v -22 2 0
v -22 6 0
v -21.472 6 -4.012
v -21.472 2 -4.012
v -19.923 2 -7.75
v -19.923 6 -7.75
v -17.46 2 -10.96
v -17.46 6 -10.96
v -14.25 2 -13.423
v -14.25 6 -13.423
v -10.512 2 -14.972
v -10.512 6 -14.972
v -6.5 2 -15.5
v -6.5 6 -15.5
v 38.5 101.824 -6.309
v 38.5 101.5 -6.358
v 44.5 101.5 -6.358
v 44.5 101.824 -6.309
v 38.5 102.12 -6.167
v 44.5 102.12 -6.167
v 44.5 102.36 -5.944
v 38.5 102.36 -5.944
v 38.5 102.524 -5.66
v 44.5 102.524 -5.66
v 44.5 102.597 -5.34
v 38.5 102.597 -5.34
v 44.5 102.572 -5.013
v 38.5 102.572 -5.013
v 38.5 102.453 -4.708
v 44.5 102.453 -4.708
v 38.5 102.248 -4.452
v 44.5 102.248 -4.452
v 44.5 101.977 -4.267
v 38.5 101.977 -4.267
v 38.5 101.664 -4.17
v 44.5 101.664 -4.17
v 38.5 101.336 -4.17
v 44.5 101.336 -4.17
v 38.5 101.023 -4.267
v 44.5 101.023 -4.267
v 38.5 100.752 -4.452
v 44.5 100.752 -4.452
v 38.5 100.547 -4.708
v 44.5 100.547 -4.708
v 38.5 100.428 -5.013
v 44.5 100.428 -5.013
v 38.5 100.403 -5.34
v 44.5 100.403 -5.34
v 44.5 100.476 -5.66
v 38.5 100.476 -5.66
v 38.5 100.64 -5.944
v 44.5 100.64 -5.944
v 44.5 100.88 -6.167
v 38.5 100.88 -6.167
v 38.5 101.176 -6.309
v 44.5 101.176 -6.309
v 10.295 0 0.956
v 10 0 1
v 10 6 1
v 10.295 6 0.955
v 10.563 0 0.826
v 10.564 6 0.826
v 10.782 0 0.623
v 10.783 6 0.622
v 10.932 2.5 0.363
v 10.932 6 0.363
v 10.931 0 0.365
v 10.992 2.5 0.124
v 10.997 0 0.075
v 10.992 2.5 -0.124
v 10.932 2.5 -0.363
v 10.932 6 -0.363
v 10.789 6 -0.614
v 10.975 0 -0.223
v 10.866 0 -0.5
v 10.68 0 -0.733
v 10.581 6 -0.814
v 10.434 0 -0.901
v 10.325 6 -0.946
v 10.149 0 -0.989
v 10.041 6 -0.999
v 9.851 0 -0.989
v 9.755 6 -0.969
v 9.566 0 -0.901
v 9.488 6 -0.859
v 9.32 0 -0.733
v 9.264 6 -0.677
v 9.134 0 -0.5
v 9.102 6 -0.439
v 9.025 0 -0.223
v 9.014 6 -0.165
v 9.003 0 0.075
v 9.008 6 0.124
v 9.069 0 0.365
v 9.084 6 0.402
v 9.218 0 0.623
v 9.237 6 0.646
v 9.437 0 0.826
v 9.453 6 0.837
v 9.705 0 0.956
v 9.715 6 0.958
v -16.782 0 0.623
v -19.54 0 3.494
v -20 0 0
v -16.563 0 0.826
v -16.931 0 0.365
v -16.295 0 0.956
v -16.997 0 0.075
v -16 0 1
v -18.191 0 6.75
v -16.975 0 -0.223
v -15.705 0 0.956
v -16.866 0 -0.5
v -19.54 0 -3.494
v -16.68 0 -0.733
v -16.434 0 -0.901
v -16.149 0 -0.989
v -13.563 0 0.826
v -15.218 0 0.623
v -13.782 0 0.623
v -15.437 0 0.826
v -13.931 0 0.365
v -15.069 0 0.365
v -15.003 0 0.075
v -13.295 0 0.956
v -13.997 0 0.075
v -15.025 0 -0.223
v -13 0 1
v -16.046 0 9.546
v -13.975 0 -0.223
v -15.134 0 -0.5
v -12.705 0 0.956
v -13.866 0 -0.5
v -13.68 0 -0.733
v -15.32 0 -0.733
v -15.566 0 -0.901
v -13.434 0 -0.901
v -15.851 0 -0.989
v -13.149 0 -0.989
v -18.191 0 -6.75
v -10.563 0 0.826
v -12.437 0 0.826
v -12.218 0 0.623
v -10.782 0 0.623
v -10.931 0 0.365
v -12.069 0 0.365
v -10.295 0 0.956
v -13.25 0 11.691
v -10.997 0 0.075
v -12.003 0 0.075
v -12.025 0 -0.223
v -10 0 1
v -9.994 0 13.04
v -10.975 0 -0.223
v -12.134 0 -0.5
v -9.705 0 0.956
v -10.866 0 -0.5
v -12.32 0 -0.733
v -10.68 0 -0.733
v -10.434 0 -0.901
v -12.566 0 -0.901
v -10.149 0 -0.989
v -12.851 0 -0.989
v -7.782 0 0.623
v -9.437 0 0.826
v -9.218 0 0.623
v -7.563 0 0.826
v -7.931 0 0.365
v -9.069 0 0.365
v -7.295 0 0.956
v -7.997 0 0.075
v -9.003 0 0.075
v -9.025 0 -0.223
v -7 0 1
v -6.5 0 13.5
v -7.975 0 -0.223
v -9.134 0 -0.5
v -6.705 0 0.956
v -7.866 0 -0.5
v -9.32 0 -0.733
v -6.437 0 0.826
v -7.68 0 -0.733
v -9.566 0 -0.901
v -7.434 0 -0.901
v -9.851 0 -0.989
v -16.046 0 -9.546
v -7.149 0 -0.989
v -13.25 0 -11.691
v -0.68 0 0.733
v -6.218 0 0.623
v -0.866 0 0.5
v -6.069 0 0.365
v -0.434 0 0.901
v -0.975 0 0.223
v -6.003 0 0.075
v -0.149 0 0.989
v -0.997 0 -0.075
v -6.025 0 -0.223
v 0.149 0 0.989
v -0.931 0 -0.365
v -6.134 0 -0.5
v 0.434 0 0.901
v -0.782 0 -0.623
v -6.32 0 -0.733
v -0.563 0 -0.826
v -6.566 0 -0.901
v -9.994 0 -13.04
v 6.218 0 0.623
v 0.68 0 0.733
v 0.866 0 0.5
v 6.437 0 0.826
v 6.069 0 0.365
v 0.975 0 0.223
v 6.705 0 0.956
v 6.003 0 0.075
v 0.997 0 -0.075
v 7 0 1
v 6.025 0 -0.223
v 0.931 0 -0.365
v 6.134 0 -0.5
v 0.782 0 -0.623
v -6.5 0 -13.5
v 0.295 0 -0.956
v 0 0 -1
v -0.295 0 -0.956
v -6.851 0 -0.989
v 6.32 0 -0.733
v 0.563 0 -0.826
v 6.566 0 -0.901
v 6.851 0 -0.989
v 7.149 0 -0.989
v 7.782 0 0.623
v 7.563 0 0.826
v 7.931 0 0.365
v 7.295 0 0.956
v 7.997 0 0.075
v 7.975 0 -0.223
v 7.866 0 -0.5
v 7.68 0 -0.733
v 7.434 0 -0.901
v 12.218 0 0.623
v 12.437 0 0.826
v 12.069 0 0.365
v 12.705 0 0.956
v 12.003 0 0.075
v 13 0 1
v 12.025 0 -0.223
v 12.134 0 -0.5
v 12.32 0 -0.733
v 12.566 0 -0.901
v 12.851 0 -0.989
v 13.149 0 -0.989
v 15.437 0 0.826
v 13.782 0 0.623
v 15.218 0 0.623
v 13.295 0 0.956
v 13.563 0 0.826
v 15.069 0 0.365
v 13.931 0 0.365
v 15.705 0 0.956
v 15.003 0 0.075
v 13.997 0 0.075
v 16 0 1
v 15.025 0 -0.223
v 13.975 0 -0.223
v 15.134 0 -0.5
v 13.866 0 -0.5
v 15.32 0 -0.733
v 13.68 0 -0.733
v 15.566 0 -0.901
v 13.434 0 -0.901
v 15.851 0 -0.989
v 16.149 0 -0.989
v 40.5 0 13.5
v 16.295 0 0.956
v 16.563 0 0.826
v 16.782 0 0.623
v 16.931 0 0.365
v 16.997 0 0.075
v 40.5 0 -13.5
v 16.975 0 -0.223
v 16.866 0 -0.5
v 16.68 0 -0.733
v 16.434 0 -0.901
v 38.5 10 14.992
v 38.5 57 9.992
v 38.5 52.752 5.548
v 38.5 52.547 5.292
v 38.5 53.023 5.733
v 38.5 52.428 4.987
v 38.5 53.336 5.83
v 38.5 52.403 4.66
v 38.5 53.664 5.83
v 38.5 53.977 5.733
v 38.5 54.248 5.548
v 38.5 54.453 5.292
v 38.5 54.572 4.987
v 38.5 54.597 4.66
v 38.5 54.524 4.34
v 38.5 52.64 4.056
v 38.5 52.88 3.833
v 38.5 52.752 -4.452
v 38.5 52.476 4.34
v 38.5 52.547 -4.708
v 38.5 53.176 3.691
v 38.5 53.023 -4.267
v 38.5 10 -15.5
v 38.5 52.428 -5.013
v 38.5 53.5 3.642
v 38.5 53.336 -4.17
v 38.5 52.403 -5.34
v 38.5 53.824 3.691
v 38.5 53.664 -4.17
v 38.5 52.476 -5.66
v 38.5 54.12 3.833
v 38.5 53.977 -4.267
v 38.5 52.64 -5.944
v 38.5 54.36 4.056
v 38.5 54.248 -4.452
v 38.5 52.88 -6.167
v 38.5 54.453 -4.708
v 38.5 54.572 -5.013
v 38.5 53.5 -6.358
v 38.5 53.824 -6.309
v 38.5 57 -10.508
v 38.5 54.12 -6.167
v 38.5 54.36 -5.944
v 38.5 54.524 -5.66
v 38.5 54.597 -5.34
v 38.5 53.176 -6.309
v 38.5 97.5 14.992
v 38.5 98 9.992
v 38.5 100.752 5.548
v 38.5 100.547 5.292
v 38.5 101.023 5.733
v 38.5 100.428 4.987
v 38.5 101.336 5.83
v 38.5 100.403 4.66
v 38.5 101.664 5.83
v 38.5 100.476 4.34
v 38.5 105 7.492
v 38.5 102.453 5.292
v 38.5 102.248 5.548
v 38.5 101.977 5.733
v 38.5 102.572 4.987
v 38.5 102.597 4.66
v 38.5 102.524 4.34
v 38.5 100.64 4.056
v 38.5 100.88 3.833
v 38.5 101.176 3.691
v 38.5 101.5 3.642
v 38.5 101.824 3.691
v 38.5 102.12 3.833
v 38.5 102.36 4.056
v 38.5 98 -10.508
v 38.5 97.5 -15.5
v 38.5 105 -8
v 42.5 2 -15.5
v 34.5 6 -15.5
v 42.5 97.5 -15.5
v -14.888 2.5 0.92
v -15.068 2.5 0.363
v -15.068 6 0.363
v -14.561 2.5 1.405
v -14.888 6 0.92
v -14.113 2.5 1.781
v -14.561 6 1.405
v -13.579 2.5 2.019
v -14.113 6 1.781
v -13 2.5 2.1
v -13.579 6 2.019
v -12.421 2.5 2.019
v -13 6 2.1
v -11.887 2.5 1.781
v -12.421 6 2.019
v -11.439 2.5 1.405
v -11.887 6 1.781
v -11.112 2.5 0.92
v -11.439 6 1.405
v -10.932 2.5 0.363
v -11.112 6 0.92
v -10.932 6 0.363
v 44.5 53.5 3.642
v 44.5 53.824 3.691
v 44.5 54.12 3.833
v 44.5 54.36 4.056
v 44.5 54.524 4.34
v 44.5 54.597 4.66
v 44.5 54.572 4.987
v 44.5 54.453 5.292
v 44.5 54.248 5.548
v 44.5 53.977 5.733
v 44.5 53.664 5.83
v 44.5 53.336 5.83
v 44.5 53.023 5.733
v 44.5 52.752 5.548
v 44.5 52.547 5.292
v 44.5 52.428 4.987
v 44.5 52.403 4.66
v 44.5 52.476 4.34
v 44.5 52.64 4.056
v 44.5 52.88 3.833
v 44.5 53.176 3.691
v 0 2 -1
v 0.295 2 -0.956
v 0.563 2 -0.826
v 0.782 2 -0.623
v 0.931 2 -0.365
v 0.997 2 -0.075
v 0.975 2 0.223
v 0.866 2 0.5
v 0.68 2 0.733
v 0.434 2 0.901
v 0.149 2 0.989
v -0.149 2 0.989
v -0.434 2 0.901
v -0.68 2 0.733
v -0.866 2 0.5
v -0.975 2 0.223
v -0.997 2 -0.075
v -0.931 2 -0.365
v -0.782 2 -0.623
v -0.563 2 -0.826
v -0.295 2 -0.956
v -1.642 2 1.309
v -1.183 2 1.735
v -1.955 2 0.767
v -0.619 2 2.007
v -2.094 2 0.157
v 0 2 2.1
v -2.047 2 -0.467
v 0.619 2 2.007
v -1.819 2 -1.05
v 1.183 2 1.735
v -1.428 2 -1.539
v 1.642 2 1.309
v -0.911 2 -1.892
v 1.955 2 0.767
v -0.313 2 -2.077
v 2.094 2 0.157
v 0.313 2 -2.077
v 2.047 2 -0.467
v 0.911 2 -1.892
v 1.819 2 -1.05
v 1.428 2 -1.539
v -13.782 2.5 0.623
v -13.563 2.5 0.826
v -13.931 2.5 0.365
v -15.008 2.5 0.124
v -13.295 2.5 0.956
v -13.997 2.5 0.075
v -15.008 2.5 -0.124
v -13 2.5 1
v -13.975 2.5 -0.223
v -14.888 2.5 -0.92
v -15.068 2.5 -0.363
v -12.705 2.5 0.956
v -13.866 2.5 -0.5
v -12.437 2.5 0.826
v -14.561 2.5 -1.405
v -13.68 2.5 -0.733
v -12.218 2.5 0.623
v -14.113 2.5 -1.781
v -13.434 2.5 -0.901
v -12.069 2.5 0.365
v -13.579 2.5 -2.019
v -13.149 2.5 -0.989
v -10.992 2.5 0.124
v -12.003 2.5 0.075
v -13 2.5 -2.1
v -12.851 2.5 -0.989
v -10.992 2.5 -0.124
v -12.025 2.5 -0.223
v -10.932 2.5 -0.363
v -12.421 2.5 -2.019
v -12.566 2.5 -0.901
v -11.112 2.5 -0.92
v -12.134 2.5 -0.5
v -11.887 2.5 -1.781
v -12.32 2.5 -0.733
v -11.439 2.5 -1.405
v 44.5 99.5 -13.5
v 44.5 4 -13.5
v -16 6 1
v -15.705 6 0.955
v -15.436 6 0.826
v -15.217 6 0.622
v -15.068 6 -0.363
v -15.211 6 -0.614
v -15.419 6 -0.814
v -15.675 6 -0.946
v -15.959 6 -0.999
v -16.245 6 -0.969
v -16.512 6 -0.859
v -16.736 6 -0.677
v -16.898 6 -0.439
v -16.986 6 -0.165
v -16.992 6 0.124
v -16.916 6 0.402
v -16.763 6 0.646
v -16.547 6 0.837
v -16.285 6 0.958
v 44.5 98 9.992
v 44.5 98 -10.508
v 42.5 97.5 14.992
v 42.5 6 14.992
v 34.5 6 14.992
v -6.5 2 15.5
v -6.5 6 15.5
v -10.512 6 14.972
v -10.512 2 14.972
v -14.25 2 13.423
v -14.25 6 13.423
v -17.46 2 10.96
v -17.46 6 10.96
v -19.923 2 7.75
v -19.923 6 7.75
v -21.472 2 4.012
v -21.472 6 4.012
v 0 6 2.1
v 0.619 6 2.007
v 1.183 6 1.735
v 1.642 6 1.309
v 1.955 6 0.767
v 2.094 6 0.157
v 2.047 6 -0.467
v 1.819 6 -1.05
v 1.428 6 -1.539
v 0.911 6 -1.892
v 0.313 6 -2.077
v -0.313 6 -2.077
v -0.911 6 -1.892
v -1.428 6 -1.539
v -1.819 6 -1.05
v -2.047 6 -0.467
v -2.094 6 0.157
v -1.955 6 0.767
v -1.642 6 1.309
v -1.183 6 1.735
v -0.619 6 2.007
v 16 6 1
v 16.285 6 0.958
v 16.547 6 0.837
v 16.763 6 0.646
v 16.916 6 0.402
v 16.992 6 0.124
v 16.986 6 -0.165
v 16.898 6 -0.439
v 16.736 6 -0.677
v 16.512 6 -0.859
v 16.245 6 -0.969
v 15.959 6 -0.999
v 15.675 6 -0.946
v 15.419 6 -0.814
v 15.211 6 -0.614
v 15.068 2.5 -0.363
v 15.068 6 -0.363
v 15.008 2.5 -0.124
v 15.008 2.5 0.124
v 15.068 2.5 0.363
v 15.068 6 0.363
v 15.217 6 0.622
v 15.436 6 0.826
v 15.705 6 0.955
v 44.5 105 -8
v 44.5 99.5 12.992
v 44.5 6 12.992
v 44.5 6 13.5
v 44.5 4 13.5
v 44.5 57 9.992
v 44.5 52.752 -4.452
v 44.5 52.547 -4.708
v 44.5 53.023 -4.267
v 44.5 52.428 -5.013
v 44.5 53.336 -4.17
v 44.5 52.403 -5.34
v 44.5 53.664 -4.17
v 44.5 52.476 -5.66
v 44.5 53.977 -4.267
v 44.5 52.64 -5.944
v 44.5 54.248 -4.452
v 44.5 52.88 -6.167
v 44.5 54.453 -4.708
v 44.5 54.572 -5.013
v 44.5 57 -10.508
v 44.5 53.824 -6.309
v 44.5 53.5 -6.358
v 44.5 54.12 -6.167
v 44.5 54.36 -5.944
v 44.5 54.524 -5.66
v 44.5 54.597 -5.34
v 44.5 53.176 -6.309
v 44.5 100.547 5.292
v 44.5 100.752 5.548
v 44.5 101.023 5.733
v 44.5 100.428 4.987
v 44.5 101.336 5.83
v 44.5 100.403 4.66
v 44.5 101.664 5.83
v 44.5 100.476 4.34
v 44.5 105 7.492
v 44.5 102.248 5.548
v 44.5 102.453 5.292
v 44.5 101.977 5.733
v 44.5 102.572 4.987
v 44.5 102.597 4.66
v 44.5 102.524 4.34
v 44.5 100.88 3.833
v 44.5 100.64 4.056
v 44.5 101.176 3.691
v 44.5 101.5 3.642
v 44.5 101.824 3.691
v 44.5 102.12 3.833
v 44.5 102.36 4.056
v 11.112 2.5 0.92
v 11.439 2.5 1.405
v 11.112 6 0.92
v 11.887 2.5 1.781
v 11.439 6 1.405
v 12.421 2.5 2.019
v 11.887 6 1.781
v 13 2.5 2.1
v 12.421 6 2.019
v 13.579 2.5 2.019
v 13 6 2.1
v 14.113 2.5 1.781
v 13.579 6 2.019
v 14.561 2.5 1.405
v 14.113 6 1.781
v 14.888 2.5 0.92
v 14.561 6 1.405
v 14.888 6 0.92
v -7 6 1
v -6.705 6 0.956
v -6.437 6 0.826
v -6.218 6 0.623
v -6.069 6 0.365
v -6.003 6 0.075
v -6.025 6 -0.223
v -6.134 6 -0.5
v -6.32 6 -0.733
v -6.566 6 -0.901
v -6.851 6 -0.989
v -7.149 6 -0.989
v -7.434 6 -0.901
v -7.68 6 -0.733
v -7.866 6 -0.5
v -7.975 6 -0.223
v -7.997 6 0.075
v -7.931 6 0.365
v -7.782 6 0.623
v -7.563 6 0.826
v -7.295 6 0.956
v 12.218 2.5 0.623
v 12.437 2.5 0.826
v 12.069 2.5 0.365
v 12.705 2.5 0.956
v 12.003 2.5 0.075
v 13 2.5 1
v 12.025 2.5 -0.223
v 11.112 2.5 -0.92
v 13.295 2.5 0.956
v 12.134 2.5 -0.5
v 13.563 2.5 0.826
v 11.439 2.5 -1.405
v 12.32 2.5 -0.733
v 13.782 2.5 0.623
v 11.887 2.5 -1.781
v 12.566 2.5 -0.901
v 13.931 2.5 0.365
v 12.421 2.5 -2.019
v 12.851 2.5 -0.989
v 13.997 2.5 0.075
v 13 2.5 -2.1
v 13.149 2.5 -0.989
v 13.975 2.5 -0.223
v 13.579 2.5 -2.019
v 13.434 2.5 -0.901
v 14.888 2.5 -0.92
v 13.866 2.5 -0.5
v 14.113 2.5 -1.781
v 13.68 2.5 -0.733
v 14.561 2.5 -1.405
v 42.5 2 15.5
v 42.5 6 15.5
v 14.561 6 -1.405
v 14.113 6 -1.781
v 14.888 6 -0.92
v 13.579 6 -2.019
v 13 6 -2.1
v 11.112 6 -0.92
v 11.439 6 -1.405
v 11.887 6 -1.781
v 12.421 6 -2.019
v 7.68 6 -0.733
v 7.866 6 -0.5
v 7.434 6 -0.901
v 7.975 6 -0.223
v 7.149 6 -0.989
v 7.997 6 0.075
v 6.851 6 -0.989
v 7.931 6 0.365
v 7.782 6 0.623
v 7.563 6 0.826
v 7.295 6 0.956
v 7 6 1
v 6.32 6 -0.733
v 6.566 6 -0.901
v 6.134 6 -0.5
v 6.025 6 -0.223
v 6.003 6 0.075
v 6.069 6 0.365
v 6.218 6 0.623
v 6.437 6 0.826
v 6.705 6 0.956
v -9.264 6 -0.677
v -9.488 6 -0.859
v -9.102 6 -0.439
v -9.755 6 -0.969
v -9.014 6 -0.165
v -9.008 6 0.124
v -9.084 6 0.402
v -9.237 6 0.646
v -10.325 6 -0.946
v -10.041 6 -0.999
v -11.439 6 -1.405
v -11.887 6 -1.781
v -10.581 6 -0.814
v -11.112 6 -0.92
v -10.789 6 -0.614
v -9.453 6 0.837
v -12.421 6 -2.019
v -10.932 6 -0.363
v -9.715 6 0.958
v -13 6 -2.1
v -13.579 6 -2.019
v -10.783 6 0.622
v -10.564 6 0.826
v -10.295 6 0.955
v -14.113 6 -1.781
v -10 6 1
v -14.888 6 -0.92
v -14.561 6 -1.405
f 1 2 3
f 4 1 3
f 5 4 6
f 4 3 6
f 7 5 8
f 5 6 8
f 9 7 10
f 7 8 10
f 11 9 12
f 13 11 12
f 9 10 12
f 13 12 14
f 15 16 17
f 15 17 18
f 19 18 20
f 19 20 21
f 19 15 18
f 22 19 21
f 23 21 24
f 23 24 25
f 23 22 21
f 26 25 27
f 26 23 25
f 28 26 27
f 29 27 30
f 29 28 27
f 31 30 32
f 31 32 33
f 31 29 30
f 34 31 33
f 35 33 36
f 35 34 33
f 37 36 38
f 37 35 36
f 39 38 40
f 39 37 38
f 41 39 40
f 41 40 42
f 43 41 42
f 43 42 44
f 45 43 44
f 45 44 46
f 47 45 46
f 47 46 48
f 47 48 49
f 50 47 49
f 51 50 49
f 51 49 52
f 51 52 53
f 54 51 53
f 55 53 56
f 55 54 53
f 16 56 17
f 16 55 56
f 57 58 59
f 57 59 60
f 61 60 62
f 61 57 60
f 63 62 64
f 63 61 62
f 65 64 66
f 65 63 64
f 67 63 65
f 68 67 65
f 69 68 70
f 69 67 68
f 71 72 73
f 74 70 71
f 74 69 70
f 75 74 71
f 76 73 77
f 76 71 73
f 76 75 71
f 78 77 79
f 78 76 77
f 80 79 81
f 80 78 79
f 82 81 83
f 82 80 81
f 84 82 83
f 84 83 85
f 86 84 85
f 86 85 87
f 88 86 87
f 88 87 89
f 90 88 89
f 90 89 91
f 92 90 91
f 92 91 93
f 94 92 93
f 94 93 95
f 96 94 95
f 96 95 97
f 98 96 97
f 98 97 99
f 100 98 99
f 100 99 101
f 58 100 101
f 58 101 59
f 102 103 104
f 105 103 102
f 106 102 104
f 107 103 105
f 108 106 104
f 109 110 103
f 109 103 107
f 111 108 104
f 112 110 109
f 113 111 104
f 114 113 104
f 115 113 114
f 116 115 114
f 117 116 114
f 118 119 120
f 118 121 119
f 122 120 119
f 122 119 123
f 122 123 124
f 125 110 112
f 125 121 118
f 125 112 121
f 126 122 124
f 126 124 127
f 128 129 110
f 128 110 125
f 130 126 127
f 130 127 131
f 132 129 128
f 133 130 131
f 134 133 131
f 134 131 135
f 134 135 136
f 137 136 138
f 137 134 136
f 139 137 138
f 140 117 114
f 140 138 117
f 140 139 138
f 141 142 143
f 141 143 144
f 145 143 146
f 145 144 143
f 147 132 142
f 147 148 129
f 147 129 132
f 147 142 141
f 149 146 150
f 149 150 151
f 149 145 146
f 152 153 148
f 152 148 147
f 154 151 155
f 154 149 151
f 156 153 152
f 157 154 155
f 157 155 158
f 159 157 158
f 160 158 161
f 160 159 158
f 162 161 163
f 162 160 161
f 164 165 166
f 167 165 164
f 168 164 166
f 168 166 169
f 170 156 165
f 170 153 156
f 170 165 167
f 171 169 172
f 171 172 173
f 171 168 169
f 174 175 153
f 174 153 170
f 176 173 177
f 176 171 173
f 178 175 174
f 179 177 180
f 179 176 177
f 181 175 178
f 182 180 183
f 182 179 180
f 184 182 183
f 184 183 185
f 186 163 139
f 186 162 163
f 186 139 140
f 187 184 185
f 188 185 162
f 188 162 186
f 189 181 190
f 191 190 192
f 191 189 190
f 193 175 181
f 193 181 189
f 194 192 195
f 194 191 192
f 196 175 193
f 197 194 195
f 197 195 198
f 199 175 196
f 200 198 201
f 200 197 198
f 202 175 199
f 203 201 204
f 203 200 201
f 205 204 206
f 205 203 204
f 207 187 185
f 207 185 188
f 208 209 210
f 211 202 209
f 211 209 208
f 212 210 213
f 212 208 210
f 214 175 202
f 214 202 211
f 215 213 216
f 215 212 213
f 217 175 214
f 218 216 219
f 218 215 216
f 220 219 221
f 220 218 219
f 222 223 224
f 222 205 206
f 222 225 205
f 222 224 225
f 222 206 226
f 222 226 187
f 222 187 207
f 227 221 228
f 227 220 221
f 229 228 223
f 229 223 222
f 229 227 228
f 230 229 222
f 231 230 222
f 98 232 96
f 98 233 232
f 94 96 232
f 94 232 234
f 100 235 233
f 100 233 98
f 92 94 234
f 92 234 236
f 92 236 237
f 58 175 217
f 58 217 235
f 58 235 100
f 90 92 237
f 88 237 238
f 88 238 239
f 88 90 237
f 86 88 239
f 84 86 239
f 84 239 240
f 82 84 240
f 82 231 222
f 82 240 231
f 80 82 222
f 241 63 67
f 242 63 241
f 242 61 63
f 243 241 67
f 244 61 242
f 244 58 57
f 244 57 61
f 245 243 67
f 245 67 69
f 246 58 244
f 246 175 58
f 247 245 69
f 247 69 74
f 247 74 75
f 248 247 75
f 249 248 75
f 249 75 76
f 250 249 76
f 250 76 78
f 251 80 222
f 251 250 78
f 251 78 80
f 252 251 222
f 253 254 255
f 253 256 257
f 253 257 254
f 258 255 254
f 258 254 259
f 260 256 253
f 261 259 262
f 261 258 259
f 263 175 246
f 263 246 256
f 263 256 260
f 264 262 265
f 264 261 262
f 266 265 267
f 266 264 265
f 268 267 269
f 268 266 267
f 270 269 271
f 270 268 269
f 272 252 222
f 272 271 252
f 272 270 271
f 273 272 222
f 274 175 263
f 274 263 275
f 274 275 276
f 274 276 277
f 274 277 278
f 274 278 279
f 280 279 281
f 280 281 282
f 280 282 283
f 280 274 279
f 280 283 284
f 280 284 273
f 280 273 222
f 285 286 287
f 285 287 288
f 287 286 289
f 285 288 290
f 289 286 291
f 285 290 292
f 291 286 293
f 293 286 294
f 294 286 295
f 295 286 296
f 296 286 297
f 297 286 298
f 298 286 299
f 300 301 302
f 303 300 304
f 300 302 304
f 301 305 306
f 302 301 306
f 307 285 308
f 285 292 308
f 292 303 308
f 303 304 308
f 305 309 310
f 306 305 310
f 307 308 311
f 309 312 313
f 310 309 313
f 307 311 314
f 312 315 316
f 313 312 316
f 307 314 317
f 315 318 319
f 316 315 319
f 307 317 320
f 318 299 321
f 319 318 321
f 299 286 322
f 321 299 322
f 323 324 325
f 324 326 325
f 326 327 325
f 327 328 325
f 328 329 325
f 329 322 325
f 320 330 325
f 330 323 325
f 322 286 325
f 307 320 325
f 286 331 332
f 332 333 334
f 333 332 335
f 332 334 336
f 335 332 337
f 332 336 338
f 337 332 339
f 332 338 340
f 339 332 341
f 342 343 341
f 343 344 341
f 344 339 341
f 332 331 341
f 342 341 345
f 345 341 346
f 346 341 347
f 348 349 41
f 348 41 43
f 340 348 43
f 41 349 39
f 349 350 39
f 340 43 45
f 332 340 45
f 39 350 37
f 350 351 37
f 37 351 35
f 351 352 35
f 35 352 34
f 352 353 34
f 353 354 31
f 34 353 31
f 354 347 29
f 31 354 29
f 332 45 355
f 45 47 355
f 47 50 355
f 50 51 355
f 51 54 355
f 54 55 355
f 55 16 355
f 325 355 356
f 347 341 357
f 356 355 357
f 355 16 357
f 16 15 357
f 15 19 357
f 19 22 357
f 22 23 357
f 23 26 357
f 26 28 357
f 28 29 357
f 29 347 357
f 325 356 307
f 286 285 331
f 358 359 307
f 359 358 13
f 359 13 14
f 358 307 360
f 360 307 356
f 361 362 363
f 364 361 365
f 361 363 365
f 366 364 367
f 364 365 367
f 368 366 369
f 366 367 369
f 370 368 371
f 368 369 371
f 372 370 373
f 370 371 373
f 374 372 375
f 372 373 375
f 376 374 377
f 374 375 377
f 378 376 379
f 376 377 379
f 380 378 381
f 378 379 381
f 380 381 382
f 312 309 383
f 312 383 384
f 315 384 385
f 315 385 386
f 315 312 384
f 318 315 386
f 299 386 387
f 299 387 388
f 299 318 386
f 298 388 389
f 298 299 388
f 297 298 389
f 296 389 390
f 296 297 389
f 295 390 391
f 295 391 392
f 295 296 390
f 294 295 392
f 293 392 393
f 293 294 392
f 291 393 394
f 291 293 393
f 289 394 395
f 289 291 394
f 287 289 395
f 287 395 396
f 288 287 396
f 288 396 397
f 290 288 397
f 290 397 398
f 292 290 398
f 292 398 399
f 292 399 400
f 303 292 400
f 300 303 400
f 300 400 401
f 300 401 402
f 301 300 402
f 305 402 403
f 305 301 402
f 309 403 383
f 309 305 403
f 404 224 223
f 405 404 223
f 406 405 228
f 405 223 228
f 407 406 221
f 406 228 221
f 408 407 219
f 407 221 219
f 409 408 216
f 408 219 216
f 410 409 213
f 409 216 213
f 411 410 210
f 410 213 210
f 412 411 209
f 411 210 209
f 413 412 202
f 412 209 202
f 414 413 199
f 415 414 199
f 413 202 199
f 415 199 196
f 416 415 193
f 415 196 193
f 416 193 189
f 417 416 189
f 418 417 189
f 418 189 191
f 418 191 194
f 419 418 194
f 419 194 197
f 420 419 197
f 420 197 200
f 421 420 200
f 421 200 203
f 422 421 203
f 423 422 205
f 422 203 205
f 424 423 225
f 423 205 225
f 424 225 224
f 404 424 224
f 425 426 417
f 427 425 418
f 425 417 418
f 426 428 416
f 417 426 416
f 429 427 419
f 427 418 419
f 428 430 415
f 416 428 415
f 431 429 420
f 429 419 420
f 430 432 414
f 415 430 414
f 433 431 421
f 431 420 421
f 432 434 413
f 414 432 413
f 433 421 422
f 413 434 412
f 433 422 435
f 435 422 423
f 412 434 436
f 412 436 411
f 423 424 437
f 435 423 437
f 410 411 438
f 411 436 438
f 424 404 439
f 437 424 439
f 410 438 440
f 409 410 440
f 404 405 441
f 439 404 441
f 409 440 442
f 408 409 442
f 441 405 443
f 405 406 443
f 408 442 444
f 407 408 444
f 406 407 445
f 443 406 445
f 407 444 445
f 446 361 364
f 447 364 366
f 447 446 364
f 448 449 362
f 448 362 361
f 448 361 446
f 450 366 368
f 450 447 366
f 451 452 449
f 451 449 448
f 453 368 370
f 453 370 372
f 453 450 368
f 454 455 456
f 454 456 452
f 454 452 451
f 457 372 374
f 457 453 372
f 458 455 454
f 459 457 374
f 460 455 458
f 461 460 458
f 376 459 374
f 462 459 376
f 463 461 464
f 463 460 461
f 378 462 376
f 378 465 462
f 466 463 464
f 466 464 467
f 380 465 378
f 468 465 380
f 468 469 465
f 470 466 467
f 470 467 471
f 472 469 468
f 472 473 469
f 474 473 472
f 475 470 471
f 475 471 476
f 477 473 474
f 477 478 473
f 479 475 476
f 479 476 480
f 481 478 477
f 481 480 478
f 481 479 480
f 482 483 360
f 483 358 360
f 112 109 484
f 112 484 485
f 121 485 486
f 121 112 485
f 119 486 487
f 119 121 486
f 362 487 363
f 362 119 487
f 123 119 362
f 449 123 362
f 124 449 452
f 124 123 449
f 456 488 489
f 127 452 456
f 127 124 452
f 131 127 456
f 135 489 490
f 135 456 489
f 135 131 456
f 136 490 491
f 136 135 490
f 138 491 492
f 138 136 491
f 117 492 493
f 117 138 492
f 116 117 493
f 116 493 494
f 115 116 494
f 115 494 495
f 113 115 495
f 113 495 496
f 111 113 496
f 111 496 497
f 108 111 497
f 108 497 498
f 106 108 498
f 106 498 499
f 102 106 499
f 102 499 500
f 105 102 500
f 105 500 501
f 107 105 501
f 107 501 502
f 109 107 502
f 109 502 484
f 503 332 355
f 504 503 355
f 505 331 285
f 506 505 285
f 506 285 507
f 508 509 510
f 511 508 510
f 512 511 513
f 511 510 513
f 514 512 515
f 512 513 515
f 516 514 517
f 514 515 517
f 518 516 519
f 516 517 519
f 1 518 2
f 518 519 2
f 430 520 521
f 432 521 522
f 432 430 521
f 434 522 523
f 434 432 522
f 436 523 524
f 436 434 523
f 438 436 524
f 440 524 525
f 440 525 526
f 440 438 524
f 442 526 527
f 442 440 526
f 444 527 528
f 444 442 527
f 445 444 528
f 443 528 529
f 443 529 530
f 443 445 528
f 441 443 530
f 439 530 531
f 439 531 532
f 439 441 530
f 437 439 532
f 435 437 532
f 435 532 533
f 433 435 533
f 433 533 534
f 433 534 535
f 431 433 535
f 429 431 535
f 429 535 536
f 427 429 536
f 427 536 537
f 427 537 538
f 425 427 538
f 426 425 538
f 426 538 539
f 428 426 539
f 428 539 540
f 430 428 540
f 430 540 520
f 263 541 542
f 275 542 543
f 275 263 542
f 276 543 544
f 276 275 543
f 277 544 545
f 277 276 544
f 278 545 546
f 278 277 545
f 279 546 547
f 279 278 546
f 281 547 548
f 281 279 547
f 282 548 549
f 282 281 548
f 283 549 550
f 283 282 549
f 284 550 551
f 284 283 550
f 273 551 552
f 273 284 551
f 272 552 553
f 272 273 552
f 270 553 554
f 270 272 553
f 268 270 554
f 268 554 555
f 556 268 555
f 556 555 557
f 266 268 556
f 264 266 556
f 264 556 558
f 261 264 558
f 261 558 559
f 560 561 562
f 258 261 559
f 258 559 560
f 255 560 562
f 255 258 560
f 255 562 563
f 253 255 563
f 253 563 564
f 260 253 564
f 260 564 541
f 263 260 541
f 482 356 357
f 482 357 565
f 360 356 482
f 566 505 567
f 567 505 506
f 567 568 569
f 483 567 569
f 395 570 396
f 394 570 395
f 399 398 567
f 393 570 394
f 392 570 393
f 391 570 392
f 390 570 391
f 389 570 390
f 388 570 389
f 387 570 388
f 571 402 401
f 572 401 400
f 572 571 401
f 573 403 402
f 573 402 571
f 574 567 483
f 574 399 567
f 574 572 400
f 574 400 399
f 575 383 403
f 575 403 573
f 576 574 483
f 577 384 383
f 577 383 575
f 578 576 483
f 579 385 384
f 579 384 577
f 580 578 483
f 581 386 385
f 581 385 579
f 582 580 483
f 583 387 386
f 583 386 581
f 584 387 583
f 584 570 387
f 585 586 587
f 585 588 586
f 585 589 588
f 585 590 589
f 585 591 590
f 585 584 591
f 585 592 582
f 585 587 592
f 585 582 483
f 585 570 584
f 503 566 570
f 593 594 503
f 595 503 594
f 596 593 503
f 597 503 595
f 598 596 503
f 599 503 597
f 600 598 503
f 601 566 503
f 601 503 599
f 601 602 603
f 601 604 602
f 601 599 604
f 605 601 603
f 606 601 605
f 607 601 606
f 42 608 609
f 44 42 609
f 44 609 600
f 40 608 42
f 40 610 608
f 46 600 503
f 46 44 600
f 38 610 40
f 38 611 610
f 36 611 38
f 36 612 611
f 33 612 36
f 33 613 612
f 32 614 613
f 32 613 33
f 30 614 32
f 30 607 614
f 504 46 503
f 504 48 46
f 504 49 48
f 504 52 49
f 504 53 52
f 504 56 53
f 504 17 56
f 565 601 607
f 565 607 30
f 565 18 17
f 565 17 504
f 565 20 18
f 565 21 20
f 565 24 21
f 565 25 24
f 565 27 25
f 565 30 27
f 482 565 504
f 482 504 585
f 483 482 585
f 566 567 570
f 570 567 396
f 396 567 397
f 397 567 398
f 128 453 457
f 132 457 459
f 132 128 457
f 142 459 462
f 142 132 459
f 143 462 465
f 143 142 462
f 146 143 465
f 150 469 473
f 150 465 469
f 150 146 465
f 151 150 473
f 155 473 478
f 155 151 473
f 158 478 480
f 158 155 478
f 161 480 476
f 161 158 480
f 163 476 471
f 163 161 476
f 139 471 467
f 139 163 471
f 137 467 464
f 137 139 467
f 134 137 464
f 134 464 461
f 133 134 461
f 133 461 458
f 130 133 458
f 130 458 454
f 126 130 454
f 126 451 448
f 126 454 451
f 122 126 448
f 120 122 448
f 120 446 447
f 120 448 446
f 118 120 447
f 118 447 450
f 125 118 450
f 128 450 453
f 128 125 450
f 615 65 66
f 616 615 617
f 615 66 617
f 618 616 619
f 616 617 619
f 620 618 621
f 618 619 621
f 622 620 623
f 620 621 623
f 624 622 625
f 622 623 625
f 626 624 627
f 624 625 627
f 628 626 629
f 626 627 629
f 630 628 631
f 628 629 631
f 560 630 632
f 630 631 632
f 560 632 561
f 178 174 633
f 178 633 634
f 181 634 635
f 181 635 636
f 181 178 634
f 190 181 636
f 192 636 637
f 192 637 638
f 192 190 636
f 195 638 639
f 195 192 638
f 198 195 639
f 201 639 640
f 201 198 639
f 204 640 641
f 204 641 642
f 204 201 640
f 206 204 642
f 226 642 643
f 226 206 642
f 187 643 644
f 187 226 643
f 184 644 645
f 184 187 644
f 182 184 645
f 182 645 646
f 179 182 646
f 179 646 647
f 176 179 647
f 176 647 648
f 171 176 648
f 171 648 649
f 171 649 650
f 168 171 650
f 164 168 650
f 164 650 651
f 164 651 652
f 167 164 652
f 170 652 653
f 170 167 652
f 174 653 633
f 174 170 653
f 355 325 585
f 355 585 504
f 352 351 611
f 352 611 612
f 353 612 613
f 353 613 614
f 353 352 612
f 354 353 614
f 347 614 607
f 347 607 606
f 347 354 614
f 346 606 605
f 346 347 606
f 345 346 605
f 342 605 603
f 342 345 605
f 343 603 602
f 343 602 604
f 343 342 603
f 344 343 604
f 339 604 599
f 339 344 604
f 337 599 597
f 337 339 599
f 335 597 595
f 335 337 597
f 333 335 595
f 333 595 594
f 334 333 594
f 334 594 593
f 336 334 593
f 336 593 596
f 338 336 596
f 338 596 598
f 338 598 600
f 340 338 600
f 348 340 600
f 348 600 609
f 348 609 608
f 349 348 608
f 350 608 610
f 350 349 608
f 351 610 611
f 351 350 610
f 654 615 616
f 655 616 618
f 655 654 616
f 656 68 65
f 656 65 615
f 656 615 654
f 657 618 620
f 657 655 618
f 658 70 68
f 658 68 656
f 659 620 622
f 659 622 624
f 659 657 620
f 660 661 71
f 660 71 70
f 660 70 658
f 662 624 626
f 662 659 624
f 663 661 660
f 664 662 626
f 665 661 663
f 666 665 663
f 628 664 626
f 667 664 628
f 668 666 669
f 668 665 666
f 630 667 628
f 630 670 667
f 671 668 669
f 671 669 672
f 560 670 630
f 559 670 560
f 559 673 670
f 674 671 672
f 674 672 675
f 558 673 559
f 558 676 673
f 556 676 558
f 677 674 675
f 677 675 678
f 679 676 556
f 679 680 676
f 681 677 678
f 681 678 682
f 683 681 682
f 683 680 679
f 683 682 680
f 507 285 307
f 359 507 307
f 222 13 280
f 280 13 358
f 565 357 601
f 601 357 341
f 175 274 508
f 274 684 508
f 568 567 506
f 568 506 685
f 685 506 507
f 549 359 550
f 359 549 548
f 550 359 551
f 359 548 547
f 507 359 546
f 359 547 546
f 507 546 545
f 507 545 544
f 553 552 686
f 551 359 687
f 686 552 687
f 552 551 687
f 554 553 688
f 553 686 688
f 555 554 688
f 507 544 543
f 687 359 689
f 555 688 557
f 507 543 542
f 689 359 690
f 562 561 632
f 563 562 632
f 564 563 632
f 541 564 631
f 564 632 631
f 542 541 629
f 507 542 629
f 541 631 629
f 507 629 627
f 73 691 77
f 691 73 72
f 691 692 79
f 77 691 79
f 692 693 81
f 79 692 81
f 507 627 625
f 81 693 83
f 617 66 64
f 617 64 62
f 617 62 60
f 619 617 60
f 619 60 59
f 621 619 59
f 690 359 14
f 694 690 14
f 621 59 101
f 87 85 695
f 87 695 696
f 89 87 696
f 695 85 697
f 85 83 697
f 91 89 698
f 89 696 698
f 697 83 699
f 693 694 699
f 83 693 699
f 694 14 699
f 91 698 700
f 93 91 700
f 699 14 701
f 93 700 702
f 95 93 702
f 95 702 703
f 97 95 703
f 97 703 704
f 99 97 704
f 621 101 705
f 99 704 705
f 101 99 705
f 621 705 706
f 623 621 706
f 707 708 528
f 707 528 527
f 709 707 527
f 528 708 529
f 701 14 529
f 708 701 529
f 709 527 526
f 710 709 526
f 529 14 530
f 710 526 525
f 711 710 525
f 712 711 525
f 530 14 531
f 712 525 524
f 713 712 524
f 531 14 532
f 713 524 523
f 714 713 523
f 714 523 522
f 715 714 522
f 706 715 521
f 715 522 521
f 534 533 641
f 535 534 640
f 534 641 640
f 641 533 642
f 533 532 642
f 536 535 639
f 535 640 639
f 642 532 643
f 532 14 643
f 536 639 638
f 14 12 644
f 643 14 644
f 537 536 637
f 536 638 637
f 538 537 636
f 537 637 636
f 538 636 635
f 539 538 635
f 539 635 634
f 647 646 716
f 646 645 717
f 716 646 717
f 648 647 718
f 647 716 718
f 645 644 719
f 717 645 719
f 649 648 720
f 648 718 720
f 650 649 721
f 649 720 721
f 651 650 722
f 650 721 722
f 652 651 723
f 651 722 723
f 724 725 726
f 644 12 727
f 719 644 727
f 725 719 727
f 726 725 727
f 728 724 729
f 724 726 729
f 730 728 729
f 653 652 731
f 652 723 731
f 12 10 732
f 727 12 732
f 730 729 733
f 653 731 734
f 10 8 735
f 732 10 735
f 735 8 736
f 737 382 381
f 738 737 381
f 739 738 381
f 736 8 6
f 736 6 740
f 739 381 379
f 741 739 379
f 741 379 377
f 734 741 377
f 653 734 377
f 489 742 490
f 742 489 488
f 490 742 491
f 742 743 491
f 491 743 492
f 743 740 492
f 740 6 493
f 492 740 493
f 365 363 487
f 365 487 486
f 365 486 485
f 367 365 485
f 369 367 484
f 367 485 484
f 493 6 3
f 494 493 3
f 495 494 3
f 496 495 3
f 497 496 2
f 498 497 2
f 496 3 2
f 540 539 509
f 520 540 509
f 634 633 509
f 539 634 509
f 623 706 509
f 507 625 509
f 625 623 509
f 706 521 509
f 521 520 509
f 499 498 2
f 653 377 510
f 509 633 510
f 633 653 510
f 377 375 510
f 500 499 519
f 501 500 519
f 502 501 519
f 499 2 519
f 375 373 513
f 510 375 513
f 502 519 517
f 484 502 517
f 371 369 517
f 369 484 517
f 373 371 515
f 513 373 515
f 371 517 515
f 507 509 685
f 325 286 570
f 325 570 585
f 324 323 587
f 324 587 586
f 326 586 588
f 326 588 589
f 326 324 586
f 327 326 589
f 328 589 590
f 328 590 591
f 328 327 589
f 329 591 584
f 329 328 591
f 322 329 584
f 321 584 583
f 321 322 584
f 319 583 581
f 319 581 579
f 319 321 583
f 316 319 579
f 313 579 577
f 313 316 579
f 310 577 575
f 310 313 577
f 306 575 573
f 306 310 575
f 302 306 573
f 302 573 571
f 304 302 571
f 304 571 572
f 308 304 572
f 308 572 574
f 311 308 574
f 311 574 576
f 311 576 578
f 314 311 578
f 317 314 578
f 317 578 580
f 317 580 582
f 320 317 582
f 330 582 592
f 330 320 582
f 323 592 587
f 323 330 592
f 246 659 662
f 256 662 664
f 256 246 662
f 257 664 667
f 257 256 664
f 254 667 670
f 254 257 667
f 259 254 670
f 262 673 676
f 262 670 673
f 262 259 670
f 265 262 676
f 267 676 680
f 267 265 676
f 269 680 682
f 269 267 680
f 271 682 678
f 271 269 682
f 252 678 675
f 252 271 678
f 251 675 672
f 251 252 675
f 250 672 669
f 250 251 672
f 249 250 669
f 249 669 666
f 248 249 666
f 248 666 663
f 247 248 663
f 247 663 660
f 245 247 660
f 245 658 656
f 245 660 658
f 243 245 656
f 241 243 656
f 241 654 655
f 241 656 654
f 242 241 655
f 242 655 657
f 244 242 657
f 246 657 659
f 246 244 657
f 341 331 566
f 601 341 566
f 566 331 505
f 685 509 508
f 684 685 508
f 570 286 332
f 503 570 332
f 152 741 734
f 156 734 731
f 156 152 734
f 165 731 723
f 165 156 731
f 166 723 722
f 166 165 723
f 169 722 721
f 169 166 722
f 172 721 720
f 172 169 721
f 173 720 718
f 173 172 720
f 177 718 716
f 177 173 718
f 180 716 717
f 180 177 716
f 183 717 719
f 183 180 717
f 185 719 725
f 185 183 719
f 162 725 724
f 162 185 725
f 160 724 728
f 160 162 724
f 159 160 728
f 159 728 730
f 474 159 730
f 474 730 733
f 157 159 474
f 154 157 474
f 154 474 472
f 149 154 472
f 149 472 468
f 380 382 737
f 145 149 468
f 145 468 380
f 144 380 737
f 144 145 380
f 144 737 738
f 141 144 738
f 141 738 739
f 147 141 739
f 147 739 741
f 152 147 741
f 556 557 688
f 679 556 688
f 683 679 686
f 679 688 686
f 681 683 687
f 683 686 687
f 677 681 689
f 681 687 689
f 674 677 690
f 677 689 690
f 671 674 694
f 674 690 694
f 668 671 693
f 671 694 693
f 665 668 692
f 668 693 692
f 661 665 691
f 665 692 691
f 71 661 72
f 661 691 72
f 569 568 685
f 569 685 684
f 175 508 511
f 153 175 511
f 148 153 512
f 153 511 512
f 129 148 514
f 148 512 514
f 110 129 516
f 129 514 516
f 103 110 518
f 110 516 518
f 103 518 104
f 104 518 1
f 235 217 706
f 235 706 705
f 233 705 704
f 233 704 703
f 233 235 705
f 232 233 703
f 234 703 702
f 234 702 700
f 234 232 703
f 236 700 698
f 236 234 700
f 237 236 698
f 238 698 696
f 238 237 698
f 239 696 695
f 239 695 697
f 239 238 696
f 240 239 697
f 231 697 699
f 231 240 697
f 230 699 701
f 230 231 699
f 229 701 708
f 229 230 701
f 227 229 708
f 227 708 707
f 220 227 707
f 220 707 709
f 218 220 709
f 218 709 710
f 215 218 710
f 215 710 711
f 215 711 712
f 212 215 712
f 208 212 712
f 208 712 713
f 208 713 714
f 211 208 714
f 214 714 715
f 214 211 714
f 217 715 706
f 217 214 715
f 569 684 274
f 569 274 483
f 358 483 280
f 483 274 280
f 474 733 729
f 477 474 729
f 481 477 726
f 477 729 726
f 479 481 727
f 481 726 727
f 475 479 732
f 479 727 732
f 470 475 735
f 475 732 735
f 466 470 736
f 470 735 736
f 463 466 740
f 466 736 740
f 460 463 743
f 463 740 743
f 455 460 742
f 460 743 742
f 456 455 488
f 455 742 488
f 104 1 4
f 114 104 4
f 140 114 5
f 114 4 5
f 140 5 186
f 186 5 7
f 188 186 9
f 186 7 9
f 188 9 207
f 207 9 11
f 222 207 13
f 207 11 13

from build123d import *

# Parameters (mm, degrees)
CROQUIS1_W              = 44
CROQUIS1_H              = 31
CROQUIS1_R              = 1
CROQUIS1_R_2            = 2.1
SALIENTE_EXTRUIR1_DEPTH = 6
CROQUIS2_W              = 31
CROQUIS2_H              = 6
SALIENTE_EXTRUIR2_DEPTH = 16.5
CROQUIS3_R              = 1.1
CROQUIS3_W              = 20.5
CROQUIS3_H              = 41
SALIENTE_EXTRUIR3_DEPTH = 6
CROQUIS4_R              = 2.1
CROQUIS4_R_2            = 1
SALIENTE_EXTRUIR4_DEPTH = 2
CROQUIS5_R              = 2.1
CORTAR_EXTRUIR1_DEPTH   = 3.5
REDONDEO1_R             = 15.5
CHAFL_N1_SIZE           = 2
CHAFL_N2_SIZE           = 2
CHAFL_N3_SIZE           = 4
CHAFL_N4_SIZE           = 4
CHAFL_N5_SIZE           = 7.5


with BuildPart() as part:
    # Croquis1 → Saliente-Extruir1 (new body)
    with BuildSketch(Plane(origin=(0, 0, 0), x_dir=(1, 0, 0), z_dir=(0, 1, 0))):
        Rectangle(CROQUIS1_W, CROQUIS1_H)
        with Locations(Location((13, 0, 0), (0, 0, 270))):
            Circle(CROQUIS1_R, mode=Mode.SUBTRACT)
        with Locations(Location((0, 0, 0), (0, 0, 270))):
            Circle(CROQUIS1_R_2, mode=Mode.SUBTRACT)
        with Locations(Location((7, 0, 0), (0, 0, 270))):
            Circle(CROQUIS1_R, mode=Mode.SUBTRACT)
        with Locations(Location((-7, 0, 0), (0, 0, 270))):
            Circle(CROQUIS1_R, mode=Mode.SUBTRACT)
        with Locations(Location((-10, 0, 0), (0, 0, 270))):
            Circle(CROQUIS1_R, mode=Mode.SUBTRACT)
        with Locations(Location((-13, 0, 0), (0, 0, 270))):
            Circle(CROQUIS1_R, mode=Mode.SUBTRACT)
        with Locations(Location((-16, 0, 0), (0, 0, 270))):
            Circle(CROQUIS1_R, mode=Mode.SUBTRACT)
        with Locations(Location((10, 0, 0), (0, 0, 270))):
            Circle(CROQUIS1_R, mode=Mode.SUBTRACT)
        with Locations(Location((16, 0, 0), (0, 0, 270))):
            Circle(CROQUIS1_R, mode=Mode.SUBTRACT)
    extrude(amount=SALIENTE_EXTRUIR1_DEPTH)

    # Croquis2 → Saliente-Extruir2 (add)
    with BuildSketch(Plane(origin=(22, 0, 0), x_dir=(0, 0, -1), z_dir=(1, 0, 0))):
        with Locations((0, 3)):
            Rectangle(CROQUIS2_W, CROQUIS2_H)
    extrude(amount=SALIENTE_EXTRUIR2_DEPTH)

    # Croquis3 → Saliente-Extruir3 (add)
    with BuildSketch(Plane(origin=(38.5, 0, 0), x_dir=(0, 0, -1), z_dir=(1, 0, 0))):
        Polygon((15.5, 105), (-14.991801075, 105), (-14.991801075, 6), (-15.5, 6), (-15.5, 0), (15.5, 0), align=None)
        with Locations((-4.741801075, 53.5)):
            Circle(CROQUIS3_R, mode=Mode.SUBTRACT)
        with Locations((-4.741801075, 101.5)):
            Circle(CROQUIS3_R, mode=Mode.SUBTRACT)
        with Locations((5.258198925, 53.5)):
            Circle(CROQUIS3_R, mode=Mode.SUBTRACT)
        with Locations((0.258198925, 77.5)):
            Rectangle(CROQUIS3_W, CROQUIS3_H, mode=Mode.SUBTRACT)
        with Locations((5.258198925, 101.5)):
            Circle(CROQUIS3_R, mode=Mode.SUBTRACT)
    extrude(amount=SALIENTE_EXTRUIR3_DEPTH)

    # Croquis4 → Saliente-Extruir4 (add)
    with BuildSketch(Plane.XZ):
        with Locations(Location((0, 0, 0), (0, 0, 270))):
            Circle(CROQUIS4_R)
        with Locations(Location((0, 0, 0), (0, 0, 270))):
            Circle(CROQUIS4_R_2, mode=Mode.SUBTRACT)
    extrude(amount=-SALIENTE_EXTRUIR4_DEPTH)

    # Croquis5 → Cortar-Extruir1 (cut)
    with BuildSketch(Plane(origin=(0, 6, 0), x_dir=(1, 0, 0), z_dir=(0, 1, 0))):
        with Locations((-13, 0)):
            Circle(CROQUIS5_R)
        with Locations((13, 0)):
            Circle(CROQUIS5_R)
    extrude(amount=-CORTAR_EXTRUIR1_DEPTH, mode=Mode.SUBTRACT)

    # Redondeo1
    redondeo1_edges = [part.edges().sort_by_distance(p)[0] for p in [
        (-22, 3, 15.5),
        (-22, 3, -15.5),
    ]]
    fillet(redondeo1_edges, radius=REDONDEO1_R - 0.0001)  # a hair under: the kernel refuses the full size

    # Chaflán1
    chafl_n1_edges = [part.edges().sort_by_distance(p)[0] for p in [
        (18.99995, 0, 15.5),
        (18.99995, 0, -15.5),
        (-17.460184398, 0, -10.960184398),
        (-17.460184398, 0, 10.960184398),
        (44.5, 52.5, -15.5),
        (44.5, 55.5, 14.991801075),
    ]]
    chamfer(chafl_n1_edges, length=CHAFL_N1_SIZE)

    # Chaflán2
    chafl_n2_edges = [part.edges().sort_by_distance(p)[0] for p in [
        (44.5, 4, 15.5),
    ]]
    chamfer(chafl_n2_edges, length=CHAFL_N2_SIZE)

    # Chaflán3
    chafl_n3_edges = [part.edges().sort_by_distance(p)[0] for p in [
        (44.5, 0, 0),
    ]]
    chamfer(chafl_n3_edges, length=CHAFL_N3_SIZE - 0.0001)  # a hair under: the kernel refuses the full size

    # Chaflán4
    chafl_n4_edges = [part.edges().sort_by_distance(p)[0] for p in [
        (38.5, 6, -0.254099463),
    ]]
    chamfer(chafl_n4_edges, length=CHAFL_N4_SIZE)

    # Chaflán5
    chafl_n5_edges = [part.edges().sort_by_distance(p)[0] for p in [
        (40.5, 105, 14.991801075),
        (40.5, 105, -15.5),
    ]]
    chamfer(chafl_n5_edges, length=CHAFL_N5_SIZE)


solid = part.part
